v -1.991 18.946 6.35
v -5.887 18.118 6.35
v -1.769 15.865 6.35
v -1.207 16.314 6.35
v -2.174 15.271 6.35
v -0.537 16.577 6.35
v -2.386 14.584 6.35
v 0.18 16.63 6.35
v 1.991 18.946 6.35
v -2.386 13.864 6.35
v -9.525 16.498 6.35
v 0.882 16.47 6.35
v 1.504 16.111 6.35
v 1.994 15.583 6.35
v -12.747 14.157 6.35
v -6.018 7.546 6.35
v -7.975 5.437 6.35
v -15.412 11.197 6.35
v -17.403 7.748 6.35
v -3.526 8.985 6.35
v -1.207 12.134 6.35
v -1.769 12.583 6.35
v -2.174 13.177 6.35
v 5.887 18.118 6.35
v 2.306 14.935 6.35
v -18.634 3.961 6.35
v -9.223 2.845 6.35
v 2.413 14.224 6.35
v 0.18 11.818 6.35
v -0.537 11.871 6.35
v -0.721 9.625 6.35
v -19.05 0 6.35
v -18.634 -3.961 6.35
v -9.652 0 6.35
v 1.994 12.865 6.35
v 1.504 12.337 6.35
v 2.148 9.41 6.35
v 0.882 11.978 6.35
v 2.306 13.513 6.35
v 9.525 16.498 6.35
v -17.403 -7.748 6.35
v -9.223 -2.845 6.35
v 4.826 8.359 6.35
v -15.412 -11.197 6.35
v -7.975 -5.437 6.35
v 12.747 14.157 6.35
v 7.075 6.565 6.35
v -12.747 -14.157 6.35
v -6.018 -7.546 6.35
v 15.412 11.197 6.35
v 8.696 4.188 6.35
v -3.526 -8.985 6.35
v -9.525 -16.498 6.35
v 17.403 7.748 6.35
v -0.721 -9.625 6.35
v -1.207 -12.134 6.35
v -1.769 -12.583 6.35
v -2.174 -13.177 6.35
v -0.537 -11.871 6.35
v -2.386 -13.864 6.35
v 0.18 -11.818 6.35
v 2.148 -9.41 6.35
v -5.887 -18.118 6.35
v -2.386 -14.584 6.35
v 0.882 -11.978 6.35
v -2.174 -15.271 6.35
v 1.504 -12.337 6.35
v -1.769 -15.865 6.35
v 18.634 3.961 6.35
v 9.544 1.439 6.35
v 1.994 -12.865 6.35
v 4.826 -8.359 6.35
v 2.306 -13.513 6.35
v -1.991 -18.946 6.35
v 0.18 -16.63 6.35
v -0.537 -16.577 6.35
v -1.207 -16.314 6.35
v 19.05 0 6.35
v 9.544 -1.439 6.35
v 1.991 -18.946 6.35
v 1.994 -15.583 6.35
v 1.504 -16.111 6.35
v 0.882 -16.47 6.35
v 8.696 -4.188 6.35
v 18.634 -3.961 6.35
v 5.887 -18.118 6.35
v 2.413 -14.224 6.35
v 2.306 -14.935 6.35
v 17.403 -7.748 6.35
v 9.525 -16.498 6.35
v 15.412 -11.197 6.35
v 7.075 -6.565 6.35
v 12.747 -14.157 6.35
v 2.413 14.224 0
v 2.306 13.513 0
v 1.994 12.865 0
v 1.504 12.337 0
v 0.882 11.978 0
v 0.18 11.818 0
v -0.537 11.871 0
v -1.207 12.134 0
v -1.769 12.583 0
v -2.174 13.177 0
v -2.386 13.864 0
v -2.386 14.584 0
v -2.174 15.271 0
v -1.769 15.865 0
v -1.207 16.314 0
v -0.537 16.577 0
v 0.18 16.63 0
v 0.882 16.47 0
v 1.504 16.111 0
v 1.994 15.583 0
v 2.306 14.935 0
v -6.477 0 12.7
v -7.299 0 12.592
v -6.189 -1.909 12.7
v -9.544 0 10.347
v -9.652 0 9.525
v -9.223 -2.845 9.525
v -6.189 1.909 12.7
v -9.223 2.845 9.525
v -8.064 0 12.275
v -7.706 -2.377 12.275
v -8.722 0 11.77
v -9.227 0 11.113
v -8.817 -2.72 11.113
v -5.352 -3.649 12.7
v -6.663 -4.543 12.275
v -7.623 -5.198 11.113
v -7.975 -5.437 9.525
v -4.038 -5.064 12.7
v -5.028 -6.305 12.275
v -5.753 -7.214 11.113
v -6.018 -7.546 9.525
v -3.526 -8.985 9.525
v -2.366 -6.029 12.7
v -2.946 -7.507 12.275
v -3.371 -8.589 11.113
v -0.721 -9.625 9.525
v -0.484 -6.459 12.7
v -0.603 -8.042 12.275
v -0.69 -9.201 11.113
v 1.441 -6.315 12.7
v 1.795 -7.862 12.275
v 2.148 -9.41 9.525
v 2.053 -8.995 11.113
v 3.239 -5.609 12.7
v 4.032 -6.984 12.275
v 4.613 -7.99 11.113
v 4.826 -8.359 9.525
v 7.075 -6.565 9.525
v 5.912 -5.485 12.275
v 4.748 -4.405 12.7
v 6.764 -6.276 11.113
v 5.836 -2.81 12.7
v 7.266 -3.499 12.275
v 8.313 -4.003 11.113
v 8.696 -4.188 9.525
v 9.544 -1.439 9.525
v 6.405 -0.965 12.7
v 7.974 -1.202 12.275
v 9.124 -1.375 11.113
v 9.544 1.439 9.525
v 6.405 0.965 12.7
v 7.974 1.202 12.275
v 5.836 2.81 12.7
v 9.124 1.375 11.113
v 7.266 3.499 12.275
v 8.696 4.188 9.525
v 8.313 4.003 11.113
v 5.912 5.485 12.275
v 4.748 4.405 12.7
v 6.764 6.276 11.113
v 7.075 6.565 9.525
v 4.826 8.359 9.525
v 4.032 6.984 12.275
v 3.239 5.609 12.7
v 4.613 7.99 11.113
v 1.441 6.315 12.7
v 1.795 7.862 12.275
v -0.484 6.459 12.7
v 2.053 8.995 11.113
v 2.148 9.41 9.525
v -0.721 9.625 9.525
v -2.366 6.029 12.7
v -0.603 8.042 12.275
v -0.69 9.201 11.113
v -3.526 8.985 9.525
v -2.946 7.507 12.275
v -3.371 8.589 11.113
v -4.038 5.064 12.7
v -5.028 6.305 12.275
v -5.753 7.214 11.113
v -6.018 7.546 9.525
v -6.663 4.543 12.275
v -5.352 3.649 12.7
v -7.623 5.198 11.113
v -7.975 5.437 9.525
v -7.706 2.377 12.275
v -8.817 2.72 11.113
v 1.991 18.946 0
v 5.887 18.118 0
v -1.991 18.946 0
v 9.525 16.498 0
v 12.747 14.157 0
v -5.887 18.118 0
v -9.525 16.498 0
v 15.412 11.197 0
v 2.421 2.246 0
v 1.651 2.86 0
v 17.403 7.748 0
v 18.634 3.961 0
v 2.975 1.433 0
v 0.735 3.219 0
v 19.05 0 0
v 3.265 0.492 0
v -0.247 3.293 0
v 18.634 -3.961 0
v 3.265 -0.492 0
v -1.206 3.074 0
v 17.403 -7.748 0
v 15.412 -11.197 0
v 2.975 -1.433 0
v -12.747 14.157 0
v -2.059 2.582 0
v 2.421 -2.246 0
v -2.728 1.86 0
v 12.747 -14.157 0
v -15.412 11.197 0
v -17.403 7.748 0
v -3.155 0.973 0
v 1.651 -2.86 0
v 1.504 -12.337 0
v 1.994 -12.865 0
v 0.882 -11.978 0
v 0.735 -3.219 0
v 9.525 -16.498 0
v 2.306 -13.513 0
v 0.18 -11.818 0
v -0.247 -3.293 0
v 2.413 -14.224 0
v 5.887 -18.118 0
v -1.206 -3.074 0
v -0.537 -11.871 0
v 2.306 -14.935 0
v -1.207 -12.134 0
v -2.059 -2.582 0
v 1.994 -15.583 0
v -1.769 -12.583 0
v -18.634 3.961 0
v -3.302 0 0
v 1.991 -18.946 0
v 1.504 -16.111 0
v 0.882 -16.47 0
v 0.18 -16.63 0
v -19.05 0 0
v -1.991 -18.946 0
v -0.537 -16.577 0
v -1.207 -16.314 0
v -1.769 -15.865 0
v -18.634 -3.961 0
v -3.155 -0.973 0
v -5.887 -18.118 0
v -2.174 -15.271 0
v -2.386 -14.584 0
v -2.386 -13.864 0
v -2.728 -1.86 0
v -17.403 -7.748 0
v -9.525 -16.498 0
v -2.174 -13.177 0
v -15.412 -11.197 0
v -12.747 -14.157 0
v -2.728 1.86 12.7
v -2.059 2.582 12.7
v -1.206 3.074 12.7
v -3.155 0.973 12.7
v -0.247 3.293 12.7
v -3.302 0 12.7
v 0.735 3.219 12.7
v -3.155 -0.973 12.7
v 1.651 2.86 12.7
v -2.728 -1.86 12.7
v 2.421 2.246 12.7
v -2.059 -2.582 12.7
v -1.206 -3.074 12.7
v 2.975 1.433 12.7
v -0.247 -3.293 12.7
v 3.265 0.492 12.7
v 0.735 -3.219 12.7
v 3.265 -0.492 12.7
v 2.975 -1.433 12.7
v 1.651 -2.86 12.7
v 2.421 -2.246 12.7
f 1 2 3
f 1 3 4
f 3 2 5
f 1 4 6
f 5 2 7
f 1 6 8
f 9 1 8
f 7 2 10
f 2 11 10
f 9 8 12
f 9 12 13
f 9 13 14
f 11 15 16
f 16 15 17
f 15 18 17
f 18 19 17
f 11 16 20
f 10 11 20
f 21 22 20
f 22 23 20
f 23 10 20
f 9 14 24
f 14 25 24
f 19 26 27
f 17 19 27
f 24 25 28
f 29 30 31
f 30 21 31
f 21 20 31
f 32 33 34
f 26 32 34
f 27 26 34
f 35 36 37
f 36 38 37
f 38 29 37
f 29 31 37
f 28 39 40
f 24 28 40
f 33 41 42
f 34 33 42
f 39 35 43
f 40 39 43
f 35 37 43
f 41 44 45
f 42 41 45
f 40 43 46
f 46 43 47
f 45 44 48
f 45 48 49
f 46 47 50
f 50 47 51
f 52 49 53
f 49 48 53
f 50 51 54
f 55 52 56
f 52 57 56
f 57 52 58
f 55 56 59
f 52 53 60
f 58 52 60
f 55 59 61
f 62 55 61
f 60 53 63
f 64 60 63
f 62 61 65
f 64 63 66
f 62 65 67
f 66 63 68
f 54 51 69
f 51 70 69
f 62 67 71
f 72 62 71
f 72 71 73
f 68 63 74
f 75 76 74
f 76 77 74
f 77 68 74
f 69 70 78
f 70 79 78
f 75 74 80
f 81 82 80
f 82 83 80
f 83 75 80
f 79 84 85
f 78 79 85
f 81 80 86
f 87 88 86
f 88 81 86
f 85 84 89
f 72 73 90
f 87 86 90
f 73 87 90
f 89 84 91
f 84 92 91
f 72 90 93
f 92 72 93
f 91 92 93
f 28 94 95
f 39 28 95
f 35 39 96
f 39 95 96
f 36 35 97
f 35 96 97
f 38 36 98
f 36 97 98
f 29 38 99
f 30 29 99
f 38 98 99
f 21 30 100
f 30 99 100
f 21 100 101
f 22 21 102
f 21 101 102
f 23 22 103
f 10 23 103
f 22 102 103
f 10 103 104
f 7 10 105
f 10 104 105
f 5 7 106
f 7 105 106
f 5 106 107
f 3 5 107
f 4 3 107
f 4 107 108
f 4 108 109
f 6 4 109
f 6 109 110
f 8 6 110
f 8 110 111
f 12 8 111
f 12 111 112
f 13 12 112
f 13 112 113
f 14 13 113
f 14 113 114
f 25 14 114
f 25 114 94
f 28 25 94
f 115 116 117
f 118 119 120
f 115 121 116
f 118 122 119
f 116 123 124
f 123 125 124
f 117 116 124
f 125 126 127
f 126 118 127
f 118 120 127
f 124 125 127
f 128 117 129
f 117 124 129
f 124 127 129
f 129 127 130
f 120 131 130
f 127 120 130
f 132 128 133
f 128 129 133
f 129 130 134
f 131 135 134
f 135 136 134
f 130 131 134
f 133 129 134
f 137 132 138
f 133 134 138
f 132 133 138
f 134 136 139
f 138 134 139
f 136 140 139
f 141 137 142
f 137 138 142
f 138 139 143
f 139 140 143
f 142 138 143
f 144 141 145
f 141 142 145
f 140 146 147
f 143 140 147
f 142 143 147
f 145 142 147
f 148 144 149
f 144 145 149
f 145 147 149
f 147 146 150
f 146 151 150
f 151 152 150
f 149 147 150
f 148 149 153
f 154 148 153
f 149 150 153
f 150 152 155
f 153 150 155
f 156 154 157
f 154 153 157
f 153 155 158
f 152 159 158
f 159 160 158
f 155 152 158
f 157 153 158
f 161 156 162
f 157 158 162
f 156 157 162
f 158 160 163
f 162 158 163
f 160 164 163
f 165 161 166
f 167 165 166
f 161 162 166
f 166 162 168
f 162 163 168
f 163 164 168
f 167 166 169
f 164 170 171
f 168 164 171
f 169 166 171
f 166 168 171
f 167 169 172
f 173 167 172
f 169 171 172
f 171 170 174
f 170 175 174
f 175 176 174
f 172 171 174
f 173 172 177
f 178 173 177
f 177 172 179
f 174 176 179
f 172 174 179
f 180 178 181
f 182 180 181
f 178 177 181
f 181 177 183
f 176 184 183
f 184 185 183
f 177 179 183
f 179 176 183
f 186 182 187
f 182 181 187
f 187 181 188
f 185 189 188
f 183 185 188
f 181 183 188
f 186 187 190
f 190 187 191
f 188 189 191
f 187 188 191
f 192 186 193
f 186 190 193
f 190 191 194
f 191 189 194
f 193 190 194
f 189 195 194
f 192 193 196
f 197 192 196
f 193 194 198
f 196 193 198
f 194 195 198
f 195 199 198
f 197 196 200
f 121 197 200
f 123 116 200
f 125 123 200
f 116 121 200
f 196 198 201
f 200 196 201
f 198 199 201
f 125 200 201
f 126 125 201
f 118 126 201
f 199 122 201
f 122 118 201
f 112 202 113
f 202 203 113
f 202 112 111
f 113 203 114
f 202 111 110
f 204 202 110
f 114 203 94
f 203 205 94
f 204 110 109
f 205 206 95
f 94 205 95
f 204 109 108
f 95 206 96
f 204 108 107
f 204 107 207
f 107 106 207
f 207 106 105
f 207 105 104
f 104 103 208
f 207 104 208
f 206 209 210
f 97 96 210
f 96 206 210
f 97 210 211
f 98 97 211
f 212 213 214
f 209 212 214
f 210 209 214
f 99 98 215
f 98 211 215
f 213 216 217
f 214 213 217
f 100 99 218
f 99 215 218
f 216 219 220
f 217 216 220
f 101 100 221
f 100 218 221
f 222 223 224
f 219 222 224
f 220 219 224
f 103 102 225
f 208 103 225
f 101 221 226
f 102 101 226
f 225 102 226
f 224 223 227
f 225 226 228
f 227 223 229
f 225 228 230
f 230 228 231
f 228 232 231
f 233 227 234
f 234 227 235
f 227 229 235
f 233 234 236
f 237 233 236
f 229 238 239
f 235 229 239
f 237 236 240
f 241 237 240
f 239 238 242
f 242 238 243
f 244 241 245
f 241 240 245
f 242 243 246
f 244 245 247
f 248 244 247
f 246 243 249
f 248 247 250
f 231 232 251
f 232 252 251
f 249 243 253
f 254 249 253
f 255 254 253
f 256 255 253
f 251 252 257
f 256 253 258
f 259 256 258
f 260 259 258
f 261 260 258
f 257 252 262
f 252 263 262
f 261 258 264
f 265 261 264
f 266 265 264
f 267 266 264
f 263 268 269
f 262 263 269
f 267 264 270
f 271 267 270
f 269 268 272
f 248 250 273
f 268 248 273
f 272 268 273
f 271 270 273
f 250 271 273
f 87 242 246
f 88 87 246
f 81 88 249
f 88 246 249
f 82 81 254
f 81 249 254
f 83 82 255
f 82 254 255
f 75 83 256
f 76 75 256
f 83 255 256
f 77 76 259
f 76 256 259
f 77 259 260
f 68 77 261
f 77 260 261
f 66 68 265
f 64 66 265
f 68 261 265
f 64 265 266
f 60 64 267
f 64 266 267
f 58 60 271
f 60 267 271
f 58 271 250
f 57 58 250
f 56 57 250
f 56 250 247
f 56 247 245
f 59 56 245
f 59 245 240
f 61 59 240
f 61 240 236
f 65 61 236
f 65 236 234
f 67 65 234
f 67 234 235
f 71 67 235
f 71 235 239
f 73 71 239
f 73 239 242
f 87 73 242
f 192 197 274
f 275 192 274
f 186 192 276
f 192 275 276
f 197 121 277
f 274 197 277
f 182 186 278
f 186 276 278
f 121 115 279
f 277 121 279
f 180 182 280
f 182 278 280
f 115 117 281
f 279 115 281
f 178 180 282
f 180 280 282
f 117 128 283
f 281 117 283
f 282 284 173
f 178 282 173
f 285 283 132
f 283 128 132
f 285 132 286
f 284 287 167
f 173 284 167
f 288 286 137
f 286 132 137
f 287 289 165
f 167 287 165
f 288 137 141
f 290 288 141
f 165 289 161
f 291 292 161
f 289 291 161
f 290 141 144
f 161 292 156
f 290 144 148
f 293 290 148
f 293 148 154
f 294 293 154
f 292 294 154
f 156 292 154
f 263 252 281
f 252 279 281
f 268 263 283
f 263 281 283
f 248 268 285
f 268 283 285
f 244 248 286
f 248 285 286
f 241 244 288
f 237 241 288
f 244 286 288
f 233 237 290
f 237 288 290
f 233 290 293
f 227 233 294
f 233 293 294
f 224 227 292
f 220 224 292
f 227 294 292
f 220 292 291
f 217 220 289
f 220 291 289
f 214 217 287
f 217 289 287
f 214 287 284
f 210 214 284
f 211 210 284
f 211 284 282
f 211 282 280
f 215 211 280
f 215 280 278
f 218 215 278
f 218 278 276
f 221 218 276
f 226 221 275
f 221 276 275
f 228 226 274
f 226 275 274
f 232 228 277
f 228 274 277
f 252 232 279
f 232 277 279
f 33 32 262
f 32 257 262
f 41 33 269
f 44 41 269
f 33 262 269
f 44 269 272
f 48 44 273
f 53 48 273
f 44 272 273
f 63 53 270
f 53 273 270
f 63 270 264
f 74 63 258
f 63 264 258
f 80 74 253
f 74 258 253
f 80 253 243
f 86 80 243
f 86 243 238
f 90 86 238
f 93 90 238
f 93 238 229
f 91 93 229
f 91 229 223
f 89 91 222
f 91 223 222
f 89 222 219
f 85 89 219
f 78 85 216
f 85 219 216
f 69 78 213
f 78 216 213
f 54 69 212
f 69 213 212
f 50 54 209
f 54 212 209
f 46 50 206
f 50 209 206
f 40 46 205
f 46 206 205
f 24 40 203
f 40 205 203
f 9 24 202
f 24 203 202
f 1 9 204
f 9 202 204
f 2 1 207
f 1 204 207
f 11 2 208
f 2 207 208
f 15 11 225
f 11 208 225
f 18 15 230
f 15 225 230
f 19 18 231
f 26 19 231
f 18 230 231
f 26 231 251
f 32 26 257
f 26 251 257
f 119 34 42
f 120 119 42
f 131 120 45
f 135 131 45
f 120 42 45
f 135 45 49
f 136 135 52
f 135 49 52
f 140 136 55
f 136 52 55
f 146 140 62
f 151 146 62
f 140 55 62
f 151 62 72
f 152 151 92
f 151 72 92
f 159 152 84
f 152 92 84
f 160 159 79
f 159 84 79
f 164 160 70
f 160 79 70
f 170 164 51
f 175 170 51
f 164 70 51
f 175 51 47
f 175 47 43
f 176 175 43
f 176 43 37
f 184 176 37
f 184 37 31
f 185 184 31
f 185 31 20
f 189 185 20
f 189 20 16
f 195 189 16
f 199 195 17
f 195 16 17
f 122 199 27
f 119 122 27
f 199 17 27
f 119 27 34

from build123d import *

# Parameters (mm, degrees)
F2_R     = 2.413
F3_DEPTH = 25.4
F4_R     = 3.175


with BuildPart() as f1:
    # F0 (on Front) → F1 (revolve)
    with BuildSketch(Plane.XZ):
        Polygon((-19.05, 0), (-3.302, 0), (-3.302, 12.7), (-9.652, 12.7), (-9.652, 6.35), (-19.05, 6.35), align=None)
    revolve(axis=Axis((0, 0, 14.768198), (0, 0, 1)))

    # F2 (on face) → F3 (cut)
    with BuildSketch(Plane(origin=(0, 0, 0), x_dir=(1, 0, 0), z_dir=(0, 0, -1))):
        with Locations((0, -14.224)):
            Circle(F2_R)
        with Locations((0, 14.224)):
            Circle(F2_R)
    extrude(amount=-F3_DEPTH, mode=Mode.SUBTRACT)

    # F4
    f4_edges = [f1.edges().sort_by_distance(p)[0] for p in [
        (9.652, 0, 12.7),
    ]]
    fillet(f4_edges, radius=F4_R)


solid = f1.part
